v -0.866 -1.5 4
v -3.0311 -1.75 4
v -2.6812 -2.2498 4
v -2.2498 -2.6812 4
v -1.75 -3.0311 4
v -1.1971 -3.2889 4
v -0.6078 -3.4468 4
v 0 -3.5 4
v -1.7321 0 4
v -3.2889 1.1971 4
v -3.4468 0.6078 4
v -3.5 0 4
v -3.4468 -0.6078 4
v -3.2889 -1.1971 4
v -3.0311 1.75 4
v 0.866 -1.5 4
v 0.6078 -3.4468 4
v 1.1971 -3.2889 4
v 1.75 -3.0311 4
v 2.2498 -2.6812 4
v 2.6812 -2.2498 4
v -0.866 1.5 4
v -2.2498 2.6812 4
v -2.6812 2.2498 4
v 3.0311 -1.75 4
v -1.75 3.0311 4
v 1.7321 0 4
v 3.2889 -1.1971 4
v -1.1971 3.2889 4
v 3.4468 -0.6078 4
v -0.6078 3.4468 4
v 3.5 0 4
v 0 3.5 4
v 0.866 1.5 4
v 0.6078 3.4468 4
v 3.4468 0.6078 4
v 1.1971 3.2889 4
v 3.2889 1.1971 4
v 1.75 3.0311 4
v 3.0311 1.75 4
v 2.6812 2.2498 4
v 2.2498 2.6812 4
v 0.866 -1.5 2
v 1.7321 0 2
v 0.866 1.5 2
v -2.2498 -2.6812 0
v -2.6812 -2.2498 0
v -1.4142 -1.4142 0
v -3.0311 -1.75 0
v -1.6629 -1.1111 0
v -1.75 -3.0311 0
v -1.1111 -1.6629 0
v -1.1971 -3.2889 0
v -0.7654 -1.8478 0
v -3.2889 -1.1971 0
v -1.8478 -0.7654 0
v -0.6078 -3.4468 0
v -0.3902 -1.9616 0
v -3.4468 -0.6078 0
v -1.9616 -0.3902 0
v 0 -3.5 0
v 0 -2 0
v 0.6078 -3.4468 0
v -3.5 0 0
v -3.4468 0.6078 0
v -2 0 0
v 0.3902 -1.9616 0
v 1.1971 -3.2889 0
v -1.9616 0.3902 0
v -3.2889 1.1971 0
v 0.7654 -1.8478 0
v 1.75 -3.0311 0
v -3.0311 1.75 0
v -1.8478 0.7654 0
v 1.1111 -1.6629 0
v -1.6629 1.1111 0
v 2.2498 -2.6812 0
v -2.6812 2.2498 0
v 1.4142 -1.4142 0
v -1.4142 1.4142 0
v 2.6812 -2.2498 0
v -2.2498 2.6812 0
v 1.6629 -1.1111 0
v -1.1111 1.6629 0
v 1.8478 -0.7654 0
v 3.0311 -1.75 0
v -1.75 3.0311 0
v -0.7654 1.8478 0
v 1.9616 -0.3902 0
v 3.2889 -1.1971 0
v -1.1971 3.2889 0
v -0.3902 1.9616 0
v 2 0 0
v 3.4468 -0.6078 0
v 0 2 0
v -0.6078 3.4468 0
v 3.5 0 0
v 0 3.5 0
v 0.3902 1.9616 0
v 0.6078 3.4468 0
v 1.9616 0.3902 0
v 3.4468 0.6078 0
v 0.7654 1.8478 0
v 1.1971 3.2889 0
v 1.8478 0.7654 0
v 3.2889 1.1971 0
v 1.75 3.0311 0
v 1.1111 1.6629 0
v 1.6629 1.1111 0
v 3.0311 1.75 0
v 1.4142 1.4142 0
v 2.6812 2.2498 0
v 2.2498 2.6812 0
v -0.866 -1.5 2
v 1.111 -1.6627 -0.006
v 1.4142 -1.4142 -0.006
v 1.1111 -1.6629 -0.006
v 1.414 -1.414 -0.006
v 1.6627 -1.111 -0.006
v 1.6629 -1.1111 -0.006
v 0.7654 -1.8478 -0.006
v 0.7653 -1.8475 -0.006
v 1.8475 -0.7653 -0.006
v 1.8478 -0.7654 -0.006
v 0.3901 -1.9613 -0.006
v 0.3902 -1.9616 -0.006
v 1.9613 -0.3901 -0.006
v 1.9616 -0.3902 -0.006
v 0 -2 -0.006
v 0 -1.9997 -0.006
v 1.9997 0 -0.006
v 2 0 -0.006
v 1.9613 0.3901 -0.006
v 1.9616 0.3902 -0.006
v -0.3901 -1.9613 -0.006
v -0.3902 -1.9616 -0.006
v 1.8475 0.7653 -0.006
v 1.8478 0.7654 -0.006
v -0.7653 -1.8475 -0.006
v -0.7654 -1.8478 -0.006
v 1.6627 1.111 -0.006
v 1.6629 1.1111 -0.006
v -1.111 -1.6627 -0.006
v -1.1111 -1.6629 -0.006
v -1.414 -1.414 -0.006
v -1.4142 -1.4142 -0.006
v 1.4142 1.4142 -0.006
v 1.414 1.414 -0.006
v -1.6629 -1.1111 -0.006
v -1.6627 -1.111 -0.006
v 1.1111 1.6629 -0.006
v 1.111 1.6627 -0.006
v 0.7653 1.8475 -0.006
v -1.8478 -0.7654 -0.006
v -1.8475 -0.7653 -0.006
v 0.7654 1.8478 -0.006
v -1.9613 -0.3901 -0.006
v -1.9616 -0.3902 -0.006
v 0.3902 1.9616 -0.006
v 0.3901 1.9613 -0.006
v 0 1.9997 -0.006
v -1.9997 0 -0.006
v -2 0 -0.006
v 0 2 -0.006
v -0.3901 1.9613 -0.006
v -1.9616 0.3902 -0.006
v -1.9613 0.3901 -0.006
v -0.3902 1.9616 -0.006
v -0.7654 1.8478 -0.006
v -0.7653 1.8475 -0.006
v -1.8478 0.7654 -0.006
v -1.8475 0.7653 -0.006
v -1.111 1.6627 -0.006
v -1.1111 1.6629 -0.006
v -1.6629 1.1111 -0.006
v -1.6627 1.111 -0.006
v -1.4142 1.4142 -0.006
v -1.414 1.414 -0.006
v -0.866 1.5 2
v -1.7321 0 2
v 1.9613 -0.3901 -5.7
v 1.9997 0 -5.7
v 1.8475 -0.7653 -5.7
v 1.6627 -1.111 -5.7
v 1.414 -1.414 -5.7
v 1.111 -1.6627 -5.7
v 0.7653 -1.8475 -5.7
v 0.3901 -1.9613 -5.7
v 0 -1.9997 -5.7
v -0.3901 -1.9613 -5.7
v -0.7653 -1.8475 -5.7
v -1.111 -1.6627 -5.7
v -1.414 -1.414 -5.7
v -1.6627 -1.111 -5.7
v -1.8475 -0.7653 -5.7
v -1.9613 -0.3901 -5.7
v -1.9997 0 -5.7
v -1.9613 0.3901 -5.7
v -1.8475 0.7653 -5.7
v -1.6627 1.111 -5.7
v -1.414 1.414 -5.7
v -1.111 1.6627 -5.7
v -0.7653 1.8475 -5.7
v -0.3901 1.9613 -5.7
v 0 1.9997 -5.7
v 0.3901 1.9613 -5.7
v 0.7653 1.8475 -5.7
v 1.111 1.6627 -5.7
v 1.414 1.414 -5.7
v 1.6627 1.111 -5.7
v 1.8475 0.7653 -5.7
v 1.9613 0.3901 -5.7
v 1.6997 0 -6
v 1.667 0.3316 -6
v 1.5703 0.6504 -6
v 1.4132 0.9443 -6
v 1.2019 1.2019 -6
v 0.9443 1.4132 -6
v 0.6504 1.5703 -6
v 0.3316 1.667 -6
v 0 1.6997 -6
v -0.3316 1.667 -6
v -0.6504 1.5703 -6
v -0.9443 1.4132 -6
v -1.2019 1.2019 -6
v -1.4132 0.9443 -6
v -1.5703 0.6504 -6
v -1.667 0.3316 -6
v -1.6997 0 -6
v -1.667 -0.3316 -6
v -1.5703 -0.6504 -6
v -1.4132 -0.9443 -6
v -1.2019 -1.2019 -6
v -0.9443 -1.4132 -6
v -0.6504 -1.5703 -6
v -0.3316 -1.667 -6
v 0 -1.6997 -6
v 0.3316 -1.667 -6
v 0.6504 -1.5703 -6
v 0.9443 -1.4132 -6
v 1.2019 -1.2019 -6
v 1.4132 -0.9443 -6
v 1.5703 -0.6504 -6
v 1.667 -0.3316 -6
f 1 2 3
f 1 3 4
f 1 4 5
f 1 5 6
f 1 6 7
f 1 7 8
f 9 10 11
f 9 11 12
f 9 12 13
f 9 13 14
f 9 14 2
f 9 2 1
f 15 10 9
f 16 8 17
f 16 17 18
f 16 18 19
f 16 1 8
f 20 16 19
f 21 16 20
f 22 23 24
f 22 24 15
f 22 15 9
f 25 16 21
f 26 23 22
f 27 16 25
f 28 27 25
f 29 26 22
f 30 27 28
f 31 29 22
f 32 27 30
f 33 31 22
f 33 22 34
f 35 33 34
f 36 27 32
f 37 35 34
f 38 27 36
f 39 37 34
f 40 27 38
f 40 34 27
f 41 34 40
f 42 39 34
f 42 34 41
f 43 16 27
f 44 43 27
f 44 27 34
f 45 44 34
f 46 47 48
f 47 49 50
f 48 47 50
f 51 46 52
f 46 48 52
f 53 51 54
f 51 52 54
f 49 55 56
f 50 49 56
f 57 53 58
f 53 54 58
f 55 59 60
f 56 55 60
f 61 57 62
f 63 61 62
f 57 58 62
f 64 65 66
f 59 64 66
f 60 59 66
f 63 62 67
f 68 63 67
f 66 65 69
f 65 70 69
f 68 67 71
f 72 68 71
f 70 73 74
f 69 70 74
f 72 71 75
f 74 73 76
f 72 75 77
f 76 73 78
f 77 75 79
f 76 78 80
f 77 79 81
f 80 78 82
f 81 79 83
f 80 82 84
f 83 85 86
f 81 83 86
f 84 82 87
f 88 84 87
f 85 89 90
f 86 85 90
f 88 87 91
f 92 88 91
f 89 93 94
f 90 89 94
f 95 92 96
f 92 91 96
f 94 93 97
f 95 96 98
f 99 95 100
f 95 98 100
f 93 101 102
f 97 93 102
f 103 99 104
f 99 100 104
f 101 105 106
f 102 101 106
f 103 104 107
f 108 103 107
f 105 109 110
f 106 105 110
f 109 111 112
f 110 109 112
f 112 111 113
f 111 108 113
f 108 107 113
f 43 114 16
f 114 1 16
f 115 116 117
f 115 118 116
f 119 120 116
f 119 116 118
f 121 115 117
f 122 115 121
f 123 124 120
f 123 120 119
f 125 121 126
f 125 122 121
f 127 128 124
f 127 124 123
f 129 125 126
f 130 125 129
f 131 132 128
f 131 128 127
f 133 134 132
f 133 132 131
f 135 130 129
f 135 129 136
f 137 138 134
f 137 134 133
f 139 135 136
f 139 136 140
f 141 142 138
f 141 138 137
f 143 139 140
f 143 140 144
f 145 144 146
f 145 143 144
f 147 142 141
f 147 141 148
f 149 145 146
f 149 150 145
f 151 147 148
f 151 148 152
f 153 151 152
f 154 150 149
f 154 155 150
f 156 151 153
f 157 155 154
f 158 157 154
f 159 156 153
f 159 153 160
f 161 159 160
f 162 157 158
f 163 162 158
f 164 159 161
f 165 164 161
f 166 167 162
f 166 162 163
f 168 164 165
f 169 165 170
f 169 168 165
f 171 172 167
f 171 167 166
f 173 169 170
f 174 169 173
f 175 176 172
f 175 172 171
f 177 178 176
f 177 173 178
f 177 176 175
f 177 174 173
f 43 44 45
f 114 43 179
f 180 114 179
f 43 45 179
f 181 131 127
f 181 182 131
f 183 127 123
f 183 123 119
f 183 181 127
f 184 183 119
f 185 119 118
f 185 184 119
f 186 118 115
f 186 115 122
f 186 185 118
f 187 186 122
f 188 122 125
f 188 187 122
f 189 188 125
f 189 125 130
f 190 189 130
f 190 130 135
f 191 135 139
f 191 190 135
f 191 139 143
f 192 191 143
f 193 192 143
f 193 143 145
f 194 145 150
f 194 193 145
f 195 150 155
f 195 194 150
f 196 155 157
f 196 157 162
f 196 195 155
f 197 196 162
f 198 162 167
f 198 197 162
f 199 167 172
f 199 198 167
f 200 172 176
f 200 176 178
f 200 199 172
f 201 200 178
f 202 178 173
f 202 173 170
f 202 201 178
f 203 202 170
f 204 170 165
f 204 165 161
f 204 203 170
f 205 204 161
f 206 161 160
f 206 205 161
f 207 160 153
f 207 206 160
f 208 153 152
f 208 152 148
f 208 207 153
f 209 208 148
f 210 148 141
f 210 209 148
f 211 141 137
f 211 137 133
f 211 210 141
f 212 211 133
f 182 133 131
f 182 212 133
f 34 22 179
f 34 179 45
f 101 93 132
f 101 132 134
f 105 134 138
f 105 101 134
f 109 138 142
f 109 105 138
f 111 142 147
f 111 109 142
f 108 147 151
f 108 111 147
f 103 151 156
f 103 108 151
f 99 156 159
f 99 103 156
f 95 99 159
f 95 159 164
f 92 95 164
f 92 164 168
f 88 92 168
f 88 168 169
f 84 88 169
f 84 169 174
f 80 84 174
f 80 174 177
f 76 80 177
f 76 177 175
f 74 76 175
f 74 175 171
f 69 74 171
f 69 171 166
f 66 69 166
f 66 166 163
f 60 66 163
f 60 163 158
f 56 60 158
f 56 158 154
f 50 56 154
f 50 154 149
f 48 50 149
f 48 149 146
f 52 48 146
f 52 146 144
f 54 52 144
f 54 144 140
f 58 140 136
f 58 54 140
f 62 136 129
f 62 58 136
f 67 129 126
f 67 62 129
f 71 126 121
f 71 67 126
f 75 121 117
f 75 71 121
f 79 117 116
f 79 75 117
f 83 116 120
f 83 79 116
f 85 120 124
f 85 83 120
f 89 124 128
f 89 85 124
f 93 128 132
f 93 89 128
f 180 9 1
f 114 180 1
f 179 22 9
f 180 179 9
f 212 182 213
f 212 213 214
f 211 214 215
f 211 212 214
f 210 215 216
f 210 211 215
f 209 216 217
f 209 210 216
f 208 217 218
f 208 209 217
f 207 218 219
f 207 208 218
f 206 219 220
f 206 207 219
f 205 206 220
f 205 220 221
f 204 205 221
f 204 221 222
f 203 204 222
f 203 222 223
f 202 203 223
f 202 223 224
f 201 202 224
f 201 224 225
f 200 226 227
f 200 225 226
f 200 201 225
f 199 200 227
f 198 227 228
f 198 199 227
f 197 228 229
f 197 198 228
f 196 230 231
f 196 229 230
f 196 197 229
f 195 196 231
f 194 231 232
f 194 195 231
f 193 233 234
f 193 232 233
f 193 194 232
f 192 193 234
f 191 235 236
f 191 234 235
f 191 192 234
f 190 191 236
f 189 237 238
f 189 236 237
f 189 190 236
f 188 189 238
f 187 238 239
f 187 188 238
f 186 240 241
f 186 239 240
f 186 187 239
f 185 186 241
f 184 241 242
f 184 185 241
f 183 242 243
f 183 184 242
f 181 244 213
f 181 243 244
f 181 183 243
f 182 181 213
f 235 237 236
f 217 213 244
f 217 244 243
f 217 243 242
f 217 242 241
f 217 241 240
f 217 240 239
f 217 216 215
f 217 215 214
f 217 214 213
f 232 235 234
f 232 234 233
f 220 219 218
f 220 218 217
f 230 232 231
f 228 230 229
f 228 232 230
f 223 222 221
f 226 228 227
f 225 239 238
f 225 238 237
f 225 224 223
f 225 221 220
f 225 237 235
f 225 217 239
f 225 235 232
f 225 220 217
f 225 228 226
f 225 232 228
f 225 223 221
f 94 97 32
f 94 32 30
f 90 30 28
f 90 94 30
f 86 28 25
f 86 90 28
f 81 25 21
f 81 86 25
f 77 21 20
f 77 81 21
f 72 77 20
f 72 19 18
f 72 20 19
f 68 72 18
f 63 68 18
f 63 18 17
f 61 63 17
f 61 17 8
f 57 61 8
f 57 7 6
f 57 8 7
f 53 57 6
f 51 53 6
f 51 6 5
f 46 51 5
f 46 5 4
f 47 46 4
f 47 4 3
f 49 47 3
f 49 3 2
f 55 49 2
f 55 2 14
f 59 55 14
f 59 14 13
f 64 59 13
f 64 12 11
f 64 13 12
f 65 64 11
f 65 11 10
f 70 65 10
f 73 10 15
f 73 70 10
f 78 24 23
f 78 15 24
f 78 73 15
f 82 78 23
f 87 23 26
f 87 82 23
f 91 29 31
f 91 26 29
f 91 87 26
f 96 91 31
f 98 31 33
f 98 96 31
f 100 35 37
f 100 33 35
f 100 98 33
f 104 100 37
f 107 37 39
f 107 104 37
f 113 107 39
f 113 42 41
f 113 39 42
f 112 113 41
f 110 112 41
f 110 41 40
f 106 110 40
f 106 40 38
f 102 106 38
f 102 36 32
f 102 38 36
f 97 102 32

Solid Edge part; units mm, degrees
sketch "Sketch1" plane through (0, 0, 0) normal (0, 0, 1) x (1, 0, 0)
  circle A0 centre (0, 0) radius 3.5
  dimension "D1" = 7
extrude "Protrusion1" add sketch "Sketch1" along normal blind 4
sketch "Sketch2" plane through (0, 0, 0) normal (0, 0, -1) x (1, 0, 0)
  circle A0 centre (0, 0) radius 2
extrude "Protrusion2" add sketch "Sketch2" along normal blind 6
sketch "Sketch3" plane through (0, 0, -6) normal (0, 0, -1) x (1, 0, 0)
  circle A0 centre (0, 0) radius 1.9997
extrude "Cutout1" cut sketch "Sketch3" against normal blind 5.994 flip side to cut
chamfer "Chamfer_1" distance 0.3 angle 45 1 edges at (-1.9997, 0, -6)
sketch "Sketch4" plane through (0, 0, 4) normal (0, 0, 1) x (1, 0, 0)
  line L0 (-0.866, 1.5) -> (0.866, 1.5)
  line L1 (1.7321, 0) -> (0.866, 1.5)
  line L2 (0.866, -1.5) -> (1.7321, 0)
  line L3 (-0.866, -1.5) -> (0.866, -1.5)
  line L4 (-1.7321, 0) -> (-0.866, -1.5)
  line L5 (-0.866, 1.5) -> (-1.7321, 0)
  dimension "D1" = 3
extrude "Cutout2" cut sketch "Sketch4" against normal blind 2
properties part number "185699" material "Stainless Steel, 304"
